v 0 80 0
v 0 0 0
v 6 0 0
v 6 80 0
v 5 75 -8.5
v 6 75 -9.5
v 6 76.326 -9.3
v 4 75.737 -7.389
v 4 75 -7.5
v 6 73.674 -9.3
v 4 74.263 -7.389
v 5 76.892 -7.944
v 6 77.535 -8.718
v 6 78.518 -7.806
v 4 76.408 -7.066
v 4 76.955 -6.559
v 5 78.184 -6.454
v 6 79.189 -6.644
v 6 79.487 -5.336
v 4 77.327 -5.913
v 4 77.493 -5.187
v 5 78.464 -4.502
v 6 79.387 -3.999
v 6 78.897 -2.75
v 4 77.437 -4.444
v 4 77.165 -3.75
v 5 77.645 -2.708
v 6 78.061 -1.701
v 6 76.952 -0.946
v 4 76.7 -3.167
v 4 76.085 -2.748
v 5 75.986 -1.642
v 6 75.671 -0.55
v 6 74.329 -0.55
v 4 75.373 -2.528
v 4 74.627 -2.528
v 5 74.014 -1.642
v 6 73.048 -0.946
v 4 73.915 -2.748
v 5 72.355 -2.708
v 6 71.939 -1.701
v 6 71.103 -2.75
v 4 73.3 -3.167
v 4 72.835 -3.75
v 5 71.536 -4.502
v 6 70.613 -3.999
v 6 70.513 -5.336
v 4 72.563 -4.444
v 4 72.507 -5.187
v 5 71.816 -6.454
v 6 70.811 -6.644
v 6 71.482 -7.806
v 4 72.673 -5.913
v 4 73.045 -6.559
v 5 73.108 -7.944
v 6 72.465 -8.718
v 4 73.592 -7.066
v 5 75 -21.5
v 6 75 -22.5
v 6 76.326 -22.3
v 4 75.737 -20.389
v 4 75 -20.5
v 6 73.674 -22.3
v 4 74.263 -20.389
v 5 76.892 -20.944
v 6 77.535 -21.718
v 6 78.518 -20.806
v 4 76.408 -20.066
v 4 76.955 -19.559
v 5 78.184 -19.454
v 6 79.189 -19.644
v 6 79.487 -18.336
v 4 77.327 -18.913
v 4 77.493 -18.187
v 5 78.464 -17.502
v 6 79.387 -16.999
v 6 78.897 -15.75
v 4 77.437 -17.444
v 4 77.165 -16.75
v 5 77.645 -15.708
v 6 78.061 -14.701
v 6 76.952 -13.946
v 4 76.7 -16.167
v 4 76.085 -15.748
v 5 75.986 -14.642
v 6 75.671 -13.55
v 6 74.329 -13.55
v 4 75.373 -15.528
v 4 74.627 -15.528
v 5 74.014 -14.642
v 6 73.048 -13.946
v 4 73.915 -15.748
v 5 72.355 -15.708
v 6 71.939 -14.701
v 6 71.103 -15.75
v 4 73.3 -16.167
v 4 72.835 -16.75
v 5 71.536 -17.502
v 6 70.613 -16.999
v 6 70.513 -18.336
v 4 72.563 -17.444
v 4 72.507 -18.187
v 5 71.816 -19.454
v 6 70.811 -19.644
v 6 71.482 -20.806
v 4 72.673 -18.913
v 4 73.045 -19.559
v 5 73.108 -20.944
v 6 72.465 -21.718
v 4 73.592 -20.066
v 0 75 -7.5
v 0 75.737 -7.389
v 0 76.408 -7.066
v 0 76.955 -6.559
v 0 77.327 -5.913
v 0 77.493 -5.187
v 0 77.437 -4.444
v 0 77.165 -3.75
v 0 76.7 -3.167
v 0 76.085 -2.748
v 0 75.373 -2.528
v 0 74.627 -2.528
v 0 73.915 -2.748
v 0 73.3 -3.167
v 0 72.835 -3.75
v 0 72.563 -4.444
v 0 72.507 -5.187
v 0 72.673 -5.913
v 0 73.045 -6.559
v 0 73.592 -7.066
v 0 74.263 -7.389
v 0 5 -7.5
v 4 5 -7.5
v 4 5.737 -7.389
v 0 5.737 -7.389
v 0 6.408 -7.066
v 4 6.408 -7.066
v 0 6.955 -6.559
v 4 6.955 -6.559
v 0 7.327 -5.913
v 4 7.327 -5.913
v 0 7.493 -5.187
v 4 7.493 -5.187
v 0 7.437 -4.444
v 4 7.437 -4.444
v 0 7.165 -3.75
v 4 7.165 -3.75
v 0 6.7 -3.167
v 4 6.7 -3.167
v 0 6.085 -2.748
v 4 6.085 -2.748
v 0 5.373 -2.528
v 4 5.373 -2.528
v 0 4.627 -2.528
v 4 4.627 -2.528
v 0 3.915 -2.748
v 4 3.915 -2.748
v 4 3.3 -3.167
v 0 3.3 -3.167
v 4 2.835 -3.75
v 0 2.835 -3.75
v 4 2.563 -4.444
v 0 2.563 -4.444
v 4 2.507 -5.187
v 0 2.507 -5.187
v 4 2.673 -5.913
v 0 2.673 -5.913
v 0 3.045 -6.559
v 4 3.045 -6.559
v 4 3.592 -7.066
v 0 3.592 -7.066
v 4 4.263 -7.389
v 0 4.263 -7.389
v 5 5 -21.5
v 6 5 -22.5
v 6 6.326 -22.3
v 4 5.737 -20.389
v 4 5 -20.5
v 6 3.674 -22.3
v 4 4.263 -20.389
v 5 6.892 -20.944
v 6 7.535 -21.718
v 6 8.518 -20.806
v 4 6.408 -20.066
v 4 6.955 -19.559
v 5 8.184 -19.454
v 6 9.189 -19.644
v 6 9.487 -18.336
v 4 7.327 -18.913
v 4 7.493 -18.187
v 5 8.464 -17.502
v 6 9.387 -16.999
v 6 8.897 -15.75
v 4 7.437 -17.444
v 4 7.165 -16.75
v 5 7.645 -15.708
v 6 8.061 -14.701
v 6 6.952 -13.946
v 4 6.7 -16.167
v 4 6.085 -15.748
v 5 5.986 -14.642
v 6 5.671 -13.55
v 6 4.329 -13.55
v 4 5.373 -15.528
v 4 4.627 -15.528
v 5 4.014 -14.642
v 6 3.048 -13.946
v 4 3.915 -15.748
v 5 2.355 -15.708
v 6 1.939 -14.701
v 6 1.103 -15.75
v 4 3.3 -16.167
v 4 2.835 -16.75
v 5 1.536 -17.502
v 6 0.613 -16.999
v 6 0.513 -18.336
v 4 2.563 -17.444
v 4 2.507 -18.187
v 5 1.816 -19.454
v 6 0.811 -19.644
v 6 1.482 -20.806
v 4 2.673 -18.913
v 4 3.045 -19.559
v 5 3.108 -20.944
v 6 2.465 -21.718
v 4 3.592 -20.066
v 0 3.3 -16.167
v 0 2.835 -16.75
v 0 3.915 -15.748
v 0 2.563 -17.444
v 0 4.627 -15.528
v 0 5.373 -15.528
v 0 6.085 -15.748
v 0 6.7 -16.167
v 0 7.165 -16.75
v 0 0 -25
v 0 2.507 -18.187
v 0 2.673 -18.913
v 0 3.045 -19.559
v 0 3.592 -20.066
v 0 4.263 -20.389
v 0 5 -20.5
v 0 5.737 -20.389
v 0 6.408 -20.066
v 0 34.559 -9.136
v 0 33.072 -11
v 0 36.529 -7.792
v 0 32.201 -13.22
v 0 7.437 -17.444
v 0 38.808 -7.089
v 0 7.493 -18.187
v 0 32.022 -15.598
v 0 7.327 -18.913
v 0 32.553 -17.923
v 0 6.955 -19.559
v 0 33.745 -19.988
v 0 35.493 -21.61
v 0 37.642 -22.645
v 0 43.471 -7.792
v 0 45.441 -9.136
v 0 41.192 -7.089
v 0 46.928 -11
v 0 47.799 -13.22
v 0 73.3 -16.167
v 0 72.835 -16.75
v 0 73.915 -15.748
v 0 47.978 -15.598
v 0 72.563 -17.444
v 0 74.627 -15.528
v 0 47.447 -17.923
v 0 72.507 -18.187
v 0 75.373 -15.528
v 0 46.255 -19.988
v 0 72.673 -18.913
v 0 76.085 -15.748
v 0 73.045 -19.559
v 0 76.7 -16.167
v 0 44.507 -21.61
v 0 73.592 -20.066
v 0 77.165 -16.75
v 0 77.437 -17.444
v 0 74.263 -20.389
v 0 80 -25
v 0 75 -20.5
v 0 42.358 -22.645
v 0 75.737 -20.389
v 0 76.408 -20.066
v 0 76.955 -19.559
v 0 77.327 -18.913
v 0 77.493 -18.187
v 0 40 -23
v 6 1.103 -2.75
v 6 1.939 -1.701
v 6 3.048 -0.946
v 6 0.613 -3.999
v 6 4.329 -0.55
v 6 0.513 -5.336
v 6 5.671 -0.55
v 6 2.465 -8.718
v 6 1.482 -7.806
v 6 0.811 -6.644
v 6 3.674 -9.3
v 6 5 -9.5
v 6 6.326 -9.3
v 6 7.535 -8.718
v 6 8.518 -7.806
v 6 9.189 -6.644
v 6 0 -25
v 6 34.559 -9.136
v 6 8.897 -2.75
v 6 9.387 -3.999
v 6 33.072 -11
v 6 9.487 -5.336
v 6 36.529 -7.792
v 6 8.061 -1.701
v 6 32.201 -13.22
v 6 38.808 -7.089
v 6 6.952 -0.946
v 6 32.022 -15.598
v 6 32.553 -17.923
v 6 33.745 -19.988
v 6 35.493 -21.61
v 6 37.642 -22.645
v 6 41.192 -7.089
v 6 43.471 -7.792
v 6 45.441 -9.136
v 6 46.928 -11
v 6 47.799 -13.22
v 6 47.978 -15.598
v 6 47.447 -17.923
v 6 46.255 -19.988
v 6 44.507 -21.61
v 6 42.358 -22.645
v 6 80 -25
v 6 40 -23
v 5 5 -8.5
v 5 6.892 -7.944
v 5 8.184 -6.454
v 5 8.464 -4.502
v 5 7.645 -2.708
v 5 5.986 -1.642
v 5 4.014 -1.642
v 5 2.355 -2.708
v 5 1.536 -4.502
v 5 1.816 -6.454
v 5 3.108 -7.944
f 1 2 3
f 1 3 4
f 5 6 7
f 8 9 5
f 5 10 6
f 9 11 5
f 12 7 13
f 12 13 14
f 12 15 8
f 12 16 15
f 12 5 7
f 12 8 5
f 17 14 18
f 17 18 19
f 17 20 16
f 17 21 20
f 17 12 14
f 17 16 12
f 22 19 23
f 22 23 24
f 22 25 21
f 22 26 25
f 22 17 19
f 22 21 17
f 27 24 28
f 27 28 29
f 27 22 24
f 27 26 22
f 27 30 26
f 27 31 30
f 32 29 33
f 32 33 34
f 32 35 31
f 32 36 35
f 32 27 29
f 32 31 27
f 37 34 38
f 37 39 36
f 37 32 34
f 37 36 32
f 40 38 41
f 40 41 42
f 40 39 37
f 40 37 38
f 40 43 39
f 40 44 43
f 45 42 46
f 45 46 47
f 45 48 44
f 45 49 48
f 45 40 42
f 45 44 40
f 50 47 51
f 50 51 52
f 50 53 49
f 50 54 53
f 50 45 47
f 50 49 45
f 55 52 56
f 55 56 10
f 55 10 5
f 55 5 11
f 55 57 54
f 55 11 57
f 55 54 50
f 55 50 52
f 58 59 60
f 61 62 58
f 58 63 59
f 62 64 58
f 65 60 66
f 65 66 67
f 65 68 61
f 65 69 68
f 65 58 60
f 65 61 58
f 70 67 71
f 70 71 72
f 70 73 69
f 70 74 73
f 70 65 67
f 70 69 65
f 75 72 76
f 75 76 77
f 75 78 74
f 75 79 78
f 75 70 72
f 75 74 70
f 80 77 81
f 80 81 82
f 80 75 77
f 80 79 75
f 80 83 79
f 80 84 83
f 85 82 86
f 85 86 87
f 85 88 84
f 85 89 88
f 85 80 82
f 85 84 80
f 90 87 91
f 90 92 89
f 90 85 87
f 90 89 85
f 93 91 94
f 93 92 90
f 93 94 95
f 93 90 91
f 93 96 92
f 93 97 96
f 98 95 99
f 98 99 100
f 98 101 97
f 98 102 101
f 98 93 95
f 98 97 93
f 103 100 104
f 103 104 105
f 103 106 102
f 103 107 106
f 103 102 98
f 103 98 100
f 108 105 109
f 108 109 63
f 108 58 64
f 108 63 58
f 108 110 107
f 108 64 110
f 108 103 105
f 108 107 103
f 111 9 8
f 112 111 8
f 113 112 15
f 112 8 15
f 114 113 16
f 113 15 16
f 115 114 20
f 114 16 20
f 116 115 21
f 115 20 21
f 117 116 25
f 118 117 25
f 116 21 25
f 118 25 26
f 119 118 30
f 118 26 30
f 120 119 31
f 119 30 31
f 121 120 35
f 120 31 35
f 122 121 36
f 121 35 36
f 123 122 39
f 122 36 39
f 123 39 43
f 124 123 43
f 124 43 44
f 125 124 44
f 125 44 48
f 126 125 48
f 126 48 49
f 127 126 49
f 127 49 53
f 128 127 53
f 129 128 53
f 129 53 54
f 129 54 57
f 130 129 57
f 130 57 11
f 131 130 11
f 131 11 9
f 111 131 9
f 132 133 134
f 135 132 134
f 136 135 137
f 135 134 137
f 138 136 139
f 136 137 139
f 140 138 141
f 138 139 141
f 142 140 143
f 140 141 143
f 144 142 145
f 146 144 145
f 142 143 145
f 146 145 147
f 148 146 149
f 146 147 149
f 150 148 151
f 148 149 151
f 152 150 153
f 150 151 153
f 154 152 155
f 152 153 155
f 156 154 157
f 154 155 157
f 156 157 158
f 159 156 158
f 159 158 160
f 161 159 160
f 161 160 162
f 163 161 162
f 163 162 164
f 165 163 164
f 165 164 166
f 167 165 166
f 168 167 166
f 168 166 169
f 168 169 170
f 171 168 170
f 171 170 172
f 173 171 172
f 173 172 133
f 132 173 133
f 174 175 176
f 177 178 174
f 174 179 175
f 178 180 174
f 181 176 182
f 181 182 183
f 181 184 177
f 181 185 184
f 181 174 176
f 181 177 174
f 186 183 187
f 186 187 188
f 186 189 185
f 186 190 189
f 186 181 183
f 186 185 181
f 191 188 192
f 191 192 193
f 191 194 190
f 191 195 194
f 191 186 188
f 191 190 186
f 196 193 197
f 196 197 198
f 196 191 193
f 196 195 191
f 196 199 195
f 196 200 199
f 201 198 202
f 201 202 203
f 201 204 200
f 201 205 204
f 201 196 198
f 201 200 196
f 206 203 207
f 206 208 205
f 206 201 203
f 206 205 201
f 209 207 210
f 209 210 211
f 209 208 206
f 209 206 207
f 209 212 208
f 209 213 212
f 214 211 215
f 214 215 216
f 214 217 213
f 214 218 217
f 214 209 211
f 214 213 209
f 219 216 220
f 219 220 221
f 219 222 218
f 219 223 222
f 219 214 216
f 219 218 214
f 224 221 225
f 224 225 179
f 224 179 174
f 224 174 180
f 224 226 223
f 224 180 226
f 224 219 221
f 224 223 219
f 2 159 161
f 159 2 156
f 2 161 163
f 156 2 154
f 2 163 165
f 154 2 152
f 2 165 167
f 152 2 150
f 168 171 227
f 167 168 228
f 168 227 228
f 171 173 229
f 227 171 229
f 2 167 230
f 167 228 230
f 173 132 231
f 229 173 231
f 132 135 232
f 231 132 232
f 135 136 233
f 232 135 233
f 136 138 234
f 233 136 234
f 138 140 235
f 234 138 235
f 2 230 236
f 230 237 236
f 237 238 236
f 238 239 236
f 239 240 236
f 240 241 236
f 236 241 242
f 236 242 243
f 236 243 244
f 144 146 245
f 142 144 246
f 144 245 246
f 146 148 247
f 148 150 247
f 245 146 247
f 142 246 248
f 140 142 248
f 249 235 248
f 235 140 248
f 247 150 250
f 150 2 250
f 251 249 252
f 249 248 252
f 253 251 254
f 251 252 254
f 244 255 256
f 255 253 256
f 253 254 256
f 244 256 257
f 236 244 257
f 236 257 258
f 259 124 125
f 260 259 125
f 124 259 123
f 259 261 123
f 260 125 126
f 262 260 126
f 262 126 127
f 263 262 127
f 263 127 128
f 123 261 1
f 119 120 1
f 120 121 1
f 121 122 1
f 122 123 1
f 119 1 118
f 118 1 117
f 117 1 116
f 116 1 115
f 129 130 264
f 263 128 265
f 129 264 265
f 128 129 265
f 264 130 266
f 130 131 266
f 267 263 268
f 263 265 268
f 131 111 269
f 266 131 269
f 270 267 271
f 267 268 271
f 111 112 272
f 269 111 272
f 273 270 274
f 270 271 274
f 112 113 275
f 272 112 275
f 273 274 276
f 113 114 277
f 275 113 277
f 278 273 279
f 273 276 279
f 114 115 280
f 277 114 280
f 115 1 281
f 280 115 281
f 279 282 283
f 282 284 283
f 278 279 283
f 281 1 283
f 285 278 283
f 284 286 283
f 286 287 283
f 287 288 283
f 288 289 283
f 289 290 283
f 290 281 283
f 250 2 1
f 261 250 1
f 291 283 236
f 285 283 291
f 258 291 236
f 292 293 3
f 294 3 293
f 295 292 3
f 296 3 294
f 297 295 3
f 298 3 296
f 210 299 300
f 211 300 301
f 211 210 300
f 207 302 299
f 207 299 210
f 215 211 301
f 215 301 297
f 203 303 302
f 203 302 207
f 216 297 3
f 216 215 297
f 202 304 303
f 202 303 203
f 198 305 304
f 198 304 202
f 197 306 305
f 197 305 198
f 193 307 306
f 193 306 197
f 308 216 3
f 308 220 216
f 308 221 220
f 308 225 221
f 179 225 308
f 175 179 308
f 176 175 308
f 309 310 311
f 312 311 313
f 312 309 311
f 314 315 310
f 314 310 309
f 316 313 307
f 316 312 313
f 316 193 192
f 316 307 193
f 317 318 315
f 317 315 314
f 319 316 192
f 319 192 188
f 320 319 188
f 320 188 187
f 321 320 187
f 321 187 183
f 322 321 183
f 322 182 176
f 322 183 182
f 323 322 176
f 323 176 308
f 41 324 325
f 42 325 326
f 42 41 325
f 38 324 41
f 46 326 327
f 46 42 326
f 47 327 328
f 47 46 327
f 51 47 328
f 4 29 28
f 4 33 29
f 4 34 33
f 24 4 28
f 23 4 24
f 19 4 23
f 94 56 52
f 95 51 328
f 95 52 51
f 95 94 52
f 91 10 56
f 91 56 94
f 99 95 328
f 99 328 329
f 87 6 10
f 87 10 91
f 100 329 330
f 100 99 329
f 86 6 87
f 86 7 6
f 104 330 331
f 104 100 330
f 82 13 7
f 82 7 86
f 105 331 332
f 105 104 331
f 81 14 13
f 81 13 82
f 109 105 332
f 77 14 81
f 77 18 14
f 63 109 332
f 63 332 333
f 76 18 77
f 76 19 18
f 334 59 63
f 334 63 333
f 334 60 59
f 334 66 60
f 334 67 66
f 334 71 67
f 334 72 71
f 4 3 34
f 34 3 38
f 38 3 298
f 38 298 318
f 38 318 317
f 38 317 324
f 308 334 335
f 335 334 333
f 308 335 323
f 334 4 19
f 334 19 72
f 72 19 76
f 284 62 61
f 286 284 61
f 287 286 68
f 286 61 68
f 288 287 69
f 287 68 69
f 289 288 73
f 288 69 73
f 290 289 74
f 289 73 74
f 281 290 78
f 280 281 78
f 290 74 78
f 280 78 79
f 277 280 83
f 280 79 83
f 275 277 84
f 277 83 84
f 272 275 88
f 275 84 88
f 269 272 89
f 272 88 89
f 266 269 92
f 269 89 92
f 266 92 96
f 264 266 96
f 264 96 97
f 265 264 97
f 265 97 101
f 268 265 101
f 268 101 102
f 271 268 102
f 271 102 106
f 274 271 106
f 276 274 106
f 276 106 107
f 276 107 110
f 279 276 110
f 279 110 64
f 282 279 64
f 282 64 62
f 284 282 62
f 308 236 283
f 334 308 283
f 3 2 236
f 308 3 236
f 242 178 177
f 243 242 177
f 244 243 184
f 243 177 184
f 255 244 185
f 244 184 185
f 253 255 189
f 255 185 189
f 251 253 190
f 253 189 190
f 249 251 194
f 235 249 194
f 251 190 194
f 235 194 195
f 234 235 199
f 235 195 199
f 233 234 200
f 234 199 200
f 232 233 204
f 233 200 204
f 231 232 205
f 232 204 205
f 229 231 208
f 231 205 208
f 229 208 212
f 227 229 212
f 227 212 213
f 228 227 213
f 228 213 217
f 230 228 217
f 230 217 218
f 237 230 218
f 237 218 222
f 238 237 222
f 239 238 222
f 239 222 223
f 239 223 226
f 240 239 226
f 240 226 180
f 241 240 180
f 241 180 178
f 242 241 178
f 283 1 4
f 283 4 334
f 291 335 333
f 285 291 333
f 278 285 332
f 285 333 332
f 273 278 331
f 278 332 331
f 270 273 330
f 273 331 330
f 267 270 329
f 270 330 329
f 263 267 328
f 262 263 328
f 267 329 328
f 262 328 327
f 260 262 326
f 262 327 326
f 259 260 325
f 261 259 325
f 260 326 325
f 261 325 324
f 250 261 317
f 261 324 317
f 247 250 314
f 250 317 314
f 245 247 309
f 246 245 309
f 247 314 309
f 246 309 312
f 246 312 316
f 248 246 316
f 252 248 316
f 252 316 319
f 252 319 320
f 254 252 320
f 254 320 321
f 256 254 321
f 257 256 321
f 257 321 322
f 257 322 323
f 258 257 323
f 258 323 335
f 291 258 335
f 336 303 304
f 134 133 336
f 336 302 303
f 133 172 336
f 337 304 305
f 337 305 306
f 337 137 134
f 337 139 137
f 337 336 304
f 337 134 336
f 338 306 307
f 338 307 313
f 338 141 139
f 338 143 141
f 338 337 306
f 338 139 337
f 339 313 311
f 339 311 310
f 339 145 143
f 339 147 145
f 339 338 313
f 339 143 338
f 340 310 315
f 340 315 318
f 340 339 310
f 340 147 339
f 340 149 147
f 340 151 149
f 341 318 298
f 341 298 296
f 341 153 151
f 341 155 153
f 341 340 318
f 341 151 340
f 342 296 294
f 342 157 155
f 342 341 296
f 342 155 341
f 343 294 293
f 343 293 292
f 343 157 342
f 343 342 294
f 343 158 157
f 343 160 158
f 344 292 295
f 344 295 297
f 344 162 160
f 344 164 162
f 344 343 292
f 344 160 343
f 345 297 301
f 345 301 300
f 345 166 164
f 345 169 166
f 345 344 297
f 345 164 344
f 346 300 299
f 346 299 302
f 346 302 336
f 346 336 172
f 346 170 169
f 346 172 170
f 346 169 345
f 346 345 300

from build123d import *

# Parameters (mm, degrees)
ESQUISSE1_W      = 25
ESQUISSE1_H      = 80
EXTRUSION1_DEPTH = 6
ESQUISSE2_R      = 8
ESQUISSE2_R_2    = 2.5
EXTRUSION2_DEPTH = 85.029756634
CHANFREIN1_SIZE  = 2


with BuildPart() as part:
    # Esquisse1 → Extrusion1 (new body)
    with BuildSketch(Plane(origin=(0, 0, 0), x_dir=(0, 0, -1), z_dir=(1, 0, 0))):
        with Locations((12.5, 40)):
            Rectangle(ESQUISSE1_W, ESQUISSE1_H)
    extrude(amount=EXTRUSION1_DEPTH)

    # Esquisse2 → Extrusion2 (cut, through all)
    with BuildSketch(Plane(origin=(6, 0, 0), x_dir=(0, 0, -1), z_dir=(1, 0, 0))):
        with Locations((15, 40)):
            Circle(ESQUISSE2_R)
        with Locations((5, 5)):
            Circle(ESQUISSE2_R_2)
        with Locations((18, 5)):
            Circle(ESQUISSE2_R_2)
        with Locations((5, 75)):
            Circle(ESQUISSE2_R_2)
        with Locations((18, 75)):
            Circle(ESQUISSE2_R_2)
    extrude(amount=-EXTRUSION2_DEPTH, mode=Mode.SUBTRACT)

    # Chanfrein1
    chanfrein1_edges = [part.edges().sort_by_distance(p)[0] for p in [
        (6, 5, -2.5),
        (6, 5, -15.5),
        (6, 75, -2.5),
        (6, 75, -15.5),
    ]]
    chamfer(chanfrein1_edges, length=CHANFREIN1_SIZE)


solid = part.part
